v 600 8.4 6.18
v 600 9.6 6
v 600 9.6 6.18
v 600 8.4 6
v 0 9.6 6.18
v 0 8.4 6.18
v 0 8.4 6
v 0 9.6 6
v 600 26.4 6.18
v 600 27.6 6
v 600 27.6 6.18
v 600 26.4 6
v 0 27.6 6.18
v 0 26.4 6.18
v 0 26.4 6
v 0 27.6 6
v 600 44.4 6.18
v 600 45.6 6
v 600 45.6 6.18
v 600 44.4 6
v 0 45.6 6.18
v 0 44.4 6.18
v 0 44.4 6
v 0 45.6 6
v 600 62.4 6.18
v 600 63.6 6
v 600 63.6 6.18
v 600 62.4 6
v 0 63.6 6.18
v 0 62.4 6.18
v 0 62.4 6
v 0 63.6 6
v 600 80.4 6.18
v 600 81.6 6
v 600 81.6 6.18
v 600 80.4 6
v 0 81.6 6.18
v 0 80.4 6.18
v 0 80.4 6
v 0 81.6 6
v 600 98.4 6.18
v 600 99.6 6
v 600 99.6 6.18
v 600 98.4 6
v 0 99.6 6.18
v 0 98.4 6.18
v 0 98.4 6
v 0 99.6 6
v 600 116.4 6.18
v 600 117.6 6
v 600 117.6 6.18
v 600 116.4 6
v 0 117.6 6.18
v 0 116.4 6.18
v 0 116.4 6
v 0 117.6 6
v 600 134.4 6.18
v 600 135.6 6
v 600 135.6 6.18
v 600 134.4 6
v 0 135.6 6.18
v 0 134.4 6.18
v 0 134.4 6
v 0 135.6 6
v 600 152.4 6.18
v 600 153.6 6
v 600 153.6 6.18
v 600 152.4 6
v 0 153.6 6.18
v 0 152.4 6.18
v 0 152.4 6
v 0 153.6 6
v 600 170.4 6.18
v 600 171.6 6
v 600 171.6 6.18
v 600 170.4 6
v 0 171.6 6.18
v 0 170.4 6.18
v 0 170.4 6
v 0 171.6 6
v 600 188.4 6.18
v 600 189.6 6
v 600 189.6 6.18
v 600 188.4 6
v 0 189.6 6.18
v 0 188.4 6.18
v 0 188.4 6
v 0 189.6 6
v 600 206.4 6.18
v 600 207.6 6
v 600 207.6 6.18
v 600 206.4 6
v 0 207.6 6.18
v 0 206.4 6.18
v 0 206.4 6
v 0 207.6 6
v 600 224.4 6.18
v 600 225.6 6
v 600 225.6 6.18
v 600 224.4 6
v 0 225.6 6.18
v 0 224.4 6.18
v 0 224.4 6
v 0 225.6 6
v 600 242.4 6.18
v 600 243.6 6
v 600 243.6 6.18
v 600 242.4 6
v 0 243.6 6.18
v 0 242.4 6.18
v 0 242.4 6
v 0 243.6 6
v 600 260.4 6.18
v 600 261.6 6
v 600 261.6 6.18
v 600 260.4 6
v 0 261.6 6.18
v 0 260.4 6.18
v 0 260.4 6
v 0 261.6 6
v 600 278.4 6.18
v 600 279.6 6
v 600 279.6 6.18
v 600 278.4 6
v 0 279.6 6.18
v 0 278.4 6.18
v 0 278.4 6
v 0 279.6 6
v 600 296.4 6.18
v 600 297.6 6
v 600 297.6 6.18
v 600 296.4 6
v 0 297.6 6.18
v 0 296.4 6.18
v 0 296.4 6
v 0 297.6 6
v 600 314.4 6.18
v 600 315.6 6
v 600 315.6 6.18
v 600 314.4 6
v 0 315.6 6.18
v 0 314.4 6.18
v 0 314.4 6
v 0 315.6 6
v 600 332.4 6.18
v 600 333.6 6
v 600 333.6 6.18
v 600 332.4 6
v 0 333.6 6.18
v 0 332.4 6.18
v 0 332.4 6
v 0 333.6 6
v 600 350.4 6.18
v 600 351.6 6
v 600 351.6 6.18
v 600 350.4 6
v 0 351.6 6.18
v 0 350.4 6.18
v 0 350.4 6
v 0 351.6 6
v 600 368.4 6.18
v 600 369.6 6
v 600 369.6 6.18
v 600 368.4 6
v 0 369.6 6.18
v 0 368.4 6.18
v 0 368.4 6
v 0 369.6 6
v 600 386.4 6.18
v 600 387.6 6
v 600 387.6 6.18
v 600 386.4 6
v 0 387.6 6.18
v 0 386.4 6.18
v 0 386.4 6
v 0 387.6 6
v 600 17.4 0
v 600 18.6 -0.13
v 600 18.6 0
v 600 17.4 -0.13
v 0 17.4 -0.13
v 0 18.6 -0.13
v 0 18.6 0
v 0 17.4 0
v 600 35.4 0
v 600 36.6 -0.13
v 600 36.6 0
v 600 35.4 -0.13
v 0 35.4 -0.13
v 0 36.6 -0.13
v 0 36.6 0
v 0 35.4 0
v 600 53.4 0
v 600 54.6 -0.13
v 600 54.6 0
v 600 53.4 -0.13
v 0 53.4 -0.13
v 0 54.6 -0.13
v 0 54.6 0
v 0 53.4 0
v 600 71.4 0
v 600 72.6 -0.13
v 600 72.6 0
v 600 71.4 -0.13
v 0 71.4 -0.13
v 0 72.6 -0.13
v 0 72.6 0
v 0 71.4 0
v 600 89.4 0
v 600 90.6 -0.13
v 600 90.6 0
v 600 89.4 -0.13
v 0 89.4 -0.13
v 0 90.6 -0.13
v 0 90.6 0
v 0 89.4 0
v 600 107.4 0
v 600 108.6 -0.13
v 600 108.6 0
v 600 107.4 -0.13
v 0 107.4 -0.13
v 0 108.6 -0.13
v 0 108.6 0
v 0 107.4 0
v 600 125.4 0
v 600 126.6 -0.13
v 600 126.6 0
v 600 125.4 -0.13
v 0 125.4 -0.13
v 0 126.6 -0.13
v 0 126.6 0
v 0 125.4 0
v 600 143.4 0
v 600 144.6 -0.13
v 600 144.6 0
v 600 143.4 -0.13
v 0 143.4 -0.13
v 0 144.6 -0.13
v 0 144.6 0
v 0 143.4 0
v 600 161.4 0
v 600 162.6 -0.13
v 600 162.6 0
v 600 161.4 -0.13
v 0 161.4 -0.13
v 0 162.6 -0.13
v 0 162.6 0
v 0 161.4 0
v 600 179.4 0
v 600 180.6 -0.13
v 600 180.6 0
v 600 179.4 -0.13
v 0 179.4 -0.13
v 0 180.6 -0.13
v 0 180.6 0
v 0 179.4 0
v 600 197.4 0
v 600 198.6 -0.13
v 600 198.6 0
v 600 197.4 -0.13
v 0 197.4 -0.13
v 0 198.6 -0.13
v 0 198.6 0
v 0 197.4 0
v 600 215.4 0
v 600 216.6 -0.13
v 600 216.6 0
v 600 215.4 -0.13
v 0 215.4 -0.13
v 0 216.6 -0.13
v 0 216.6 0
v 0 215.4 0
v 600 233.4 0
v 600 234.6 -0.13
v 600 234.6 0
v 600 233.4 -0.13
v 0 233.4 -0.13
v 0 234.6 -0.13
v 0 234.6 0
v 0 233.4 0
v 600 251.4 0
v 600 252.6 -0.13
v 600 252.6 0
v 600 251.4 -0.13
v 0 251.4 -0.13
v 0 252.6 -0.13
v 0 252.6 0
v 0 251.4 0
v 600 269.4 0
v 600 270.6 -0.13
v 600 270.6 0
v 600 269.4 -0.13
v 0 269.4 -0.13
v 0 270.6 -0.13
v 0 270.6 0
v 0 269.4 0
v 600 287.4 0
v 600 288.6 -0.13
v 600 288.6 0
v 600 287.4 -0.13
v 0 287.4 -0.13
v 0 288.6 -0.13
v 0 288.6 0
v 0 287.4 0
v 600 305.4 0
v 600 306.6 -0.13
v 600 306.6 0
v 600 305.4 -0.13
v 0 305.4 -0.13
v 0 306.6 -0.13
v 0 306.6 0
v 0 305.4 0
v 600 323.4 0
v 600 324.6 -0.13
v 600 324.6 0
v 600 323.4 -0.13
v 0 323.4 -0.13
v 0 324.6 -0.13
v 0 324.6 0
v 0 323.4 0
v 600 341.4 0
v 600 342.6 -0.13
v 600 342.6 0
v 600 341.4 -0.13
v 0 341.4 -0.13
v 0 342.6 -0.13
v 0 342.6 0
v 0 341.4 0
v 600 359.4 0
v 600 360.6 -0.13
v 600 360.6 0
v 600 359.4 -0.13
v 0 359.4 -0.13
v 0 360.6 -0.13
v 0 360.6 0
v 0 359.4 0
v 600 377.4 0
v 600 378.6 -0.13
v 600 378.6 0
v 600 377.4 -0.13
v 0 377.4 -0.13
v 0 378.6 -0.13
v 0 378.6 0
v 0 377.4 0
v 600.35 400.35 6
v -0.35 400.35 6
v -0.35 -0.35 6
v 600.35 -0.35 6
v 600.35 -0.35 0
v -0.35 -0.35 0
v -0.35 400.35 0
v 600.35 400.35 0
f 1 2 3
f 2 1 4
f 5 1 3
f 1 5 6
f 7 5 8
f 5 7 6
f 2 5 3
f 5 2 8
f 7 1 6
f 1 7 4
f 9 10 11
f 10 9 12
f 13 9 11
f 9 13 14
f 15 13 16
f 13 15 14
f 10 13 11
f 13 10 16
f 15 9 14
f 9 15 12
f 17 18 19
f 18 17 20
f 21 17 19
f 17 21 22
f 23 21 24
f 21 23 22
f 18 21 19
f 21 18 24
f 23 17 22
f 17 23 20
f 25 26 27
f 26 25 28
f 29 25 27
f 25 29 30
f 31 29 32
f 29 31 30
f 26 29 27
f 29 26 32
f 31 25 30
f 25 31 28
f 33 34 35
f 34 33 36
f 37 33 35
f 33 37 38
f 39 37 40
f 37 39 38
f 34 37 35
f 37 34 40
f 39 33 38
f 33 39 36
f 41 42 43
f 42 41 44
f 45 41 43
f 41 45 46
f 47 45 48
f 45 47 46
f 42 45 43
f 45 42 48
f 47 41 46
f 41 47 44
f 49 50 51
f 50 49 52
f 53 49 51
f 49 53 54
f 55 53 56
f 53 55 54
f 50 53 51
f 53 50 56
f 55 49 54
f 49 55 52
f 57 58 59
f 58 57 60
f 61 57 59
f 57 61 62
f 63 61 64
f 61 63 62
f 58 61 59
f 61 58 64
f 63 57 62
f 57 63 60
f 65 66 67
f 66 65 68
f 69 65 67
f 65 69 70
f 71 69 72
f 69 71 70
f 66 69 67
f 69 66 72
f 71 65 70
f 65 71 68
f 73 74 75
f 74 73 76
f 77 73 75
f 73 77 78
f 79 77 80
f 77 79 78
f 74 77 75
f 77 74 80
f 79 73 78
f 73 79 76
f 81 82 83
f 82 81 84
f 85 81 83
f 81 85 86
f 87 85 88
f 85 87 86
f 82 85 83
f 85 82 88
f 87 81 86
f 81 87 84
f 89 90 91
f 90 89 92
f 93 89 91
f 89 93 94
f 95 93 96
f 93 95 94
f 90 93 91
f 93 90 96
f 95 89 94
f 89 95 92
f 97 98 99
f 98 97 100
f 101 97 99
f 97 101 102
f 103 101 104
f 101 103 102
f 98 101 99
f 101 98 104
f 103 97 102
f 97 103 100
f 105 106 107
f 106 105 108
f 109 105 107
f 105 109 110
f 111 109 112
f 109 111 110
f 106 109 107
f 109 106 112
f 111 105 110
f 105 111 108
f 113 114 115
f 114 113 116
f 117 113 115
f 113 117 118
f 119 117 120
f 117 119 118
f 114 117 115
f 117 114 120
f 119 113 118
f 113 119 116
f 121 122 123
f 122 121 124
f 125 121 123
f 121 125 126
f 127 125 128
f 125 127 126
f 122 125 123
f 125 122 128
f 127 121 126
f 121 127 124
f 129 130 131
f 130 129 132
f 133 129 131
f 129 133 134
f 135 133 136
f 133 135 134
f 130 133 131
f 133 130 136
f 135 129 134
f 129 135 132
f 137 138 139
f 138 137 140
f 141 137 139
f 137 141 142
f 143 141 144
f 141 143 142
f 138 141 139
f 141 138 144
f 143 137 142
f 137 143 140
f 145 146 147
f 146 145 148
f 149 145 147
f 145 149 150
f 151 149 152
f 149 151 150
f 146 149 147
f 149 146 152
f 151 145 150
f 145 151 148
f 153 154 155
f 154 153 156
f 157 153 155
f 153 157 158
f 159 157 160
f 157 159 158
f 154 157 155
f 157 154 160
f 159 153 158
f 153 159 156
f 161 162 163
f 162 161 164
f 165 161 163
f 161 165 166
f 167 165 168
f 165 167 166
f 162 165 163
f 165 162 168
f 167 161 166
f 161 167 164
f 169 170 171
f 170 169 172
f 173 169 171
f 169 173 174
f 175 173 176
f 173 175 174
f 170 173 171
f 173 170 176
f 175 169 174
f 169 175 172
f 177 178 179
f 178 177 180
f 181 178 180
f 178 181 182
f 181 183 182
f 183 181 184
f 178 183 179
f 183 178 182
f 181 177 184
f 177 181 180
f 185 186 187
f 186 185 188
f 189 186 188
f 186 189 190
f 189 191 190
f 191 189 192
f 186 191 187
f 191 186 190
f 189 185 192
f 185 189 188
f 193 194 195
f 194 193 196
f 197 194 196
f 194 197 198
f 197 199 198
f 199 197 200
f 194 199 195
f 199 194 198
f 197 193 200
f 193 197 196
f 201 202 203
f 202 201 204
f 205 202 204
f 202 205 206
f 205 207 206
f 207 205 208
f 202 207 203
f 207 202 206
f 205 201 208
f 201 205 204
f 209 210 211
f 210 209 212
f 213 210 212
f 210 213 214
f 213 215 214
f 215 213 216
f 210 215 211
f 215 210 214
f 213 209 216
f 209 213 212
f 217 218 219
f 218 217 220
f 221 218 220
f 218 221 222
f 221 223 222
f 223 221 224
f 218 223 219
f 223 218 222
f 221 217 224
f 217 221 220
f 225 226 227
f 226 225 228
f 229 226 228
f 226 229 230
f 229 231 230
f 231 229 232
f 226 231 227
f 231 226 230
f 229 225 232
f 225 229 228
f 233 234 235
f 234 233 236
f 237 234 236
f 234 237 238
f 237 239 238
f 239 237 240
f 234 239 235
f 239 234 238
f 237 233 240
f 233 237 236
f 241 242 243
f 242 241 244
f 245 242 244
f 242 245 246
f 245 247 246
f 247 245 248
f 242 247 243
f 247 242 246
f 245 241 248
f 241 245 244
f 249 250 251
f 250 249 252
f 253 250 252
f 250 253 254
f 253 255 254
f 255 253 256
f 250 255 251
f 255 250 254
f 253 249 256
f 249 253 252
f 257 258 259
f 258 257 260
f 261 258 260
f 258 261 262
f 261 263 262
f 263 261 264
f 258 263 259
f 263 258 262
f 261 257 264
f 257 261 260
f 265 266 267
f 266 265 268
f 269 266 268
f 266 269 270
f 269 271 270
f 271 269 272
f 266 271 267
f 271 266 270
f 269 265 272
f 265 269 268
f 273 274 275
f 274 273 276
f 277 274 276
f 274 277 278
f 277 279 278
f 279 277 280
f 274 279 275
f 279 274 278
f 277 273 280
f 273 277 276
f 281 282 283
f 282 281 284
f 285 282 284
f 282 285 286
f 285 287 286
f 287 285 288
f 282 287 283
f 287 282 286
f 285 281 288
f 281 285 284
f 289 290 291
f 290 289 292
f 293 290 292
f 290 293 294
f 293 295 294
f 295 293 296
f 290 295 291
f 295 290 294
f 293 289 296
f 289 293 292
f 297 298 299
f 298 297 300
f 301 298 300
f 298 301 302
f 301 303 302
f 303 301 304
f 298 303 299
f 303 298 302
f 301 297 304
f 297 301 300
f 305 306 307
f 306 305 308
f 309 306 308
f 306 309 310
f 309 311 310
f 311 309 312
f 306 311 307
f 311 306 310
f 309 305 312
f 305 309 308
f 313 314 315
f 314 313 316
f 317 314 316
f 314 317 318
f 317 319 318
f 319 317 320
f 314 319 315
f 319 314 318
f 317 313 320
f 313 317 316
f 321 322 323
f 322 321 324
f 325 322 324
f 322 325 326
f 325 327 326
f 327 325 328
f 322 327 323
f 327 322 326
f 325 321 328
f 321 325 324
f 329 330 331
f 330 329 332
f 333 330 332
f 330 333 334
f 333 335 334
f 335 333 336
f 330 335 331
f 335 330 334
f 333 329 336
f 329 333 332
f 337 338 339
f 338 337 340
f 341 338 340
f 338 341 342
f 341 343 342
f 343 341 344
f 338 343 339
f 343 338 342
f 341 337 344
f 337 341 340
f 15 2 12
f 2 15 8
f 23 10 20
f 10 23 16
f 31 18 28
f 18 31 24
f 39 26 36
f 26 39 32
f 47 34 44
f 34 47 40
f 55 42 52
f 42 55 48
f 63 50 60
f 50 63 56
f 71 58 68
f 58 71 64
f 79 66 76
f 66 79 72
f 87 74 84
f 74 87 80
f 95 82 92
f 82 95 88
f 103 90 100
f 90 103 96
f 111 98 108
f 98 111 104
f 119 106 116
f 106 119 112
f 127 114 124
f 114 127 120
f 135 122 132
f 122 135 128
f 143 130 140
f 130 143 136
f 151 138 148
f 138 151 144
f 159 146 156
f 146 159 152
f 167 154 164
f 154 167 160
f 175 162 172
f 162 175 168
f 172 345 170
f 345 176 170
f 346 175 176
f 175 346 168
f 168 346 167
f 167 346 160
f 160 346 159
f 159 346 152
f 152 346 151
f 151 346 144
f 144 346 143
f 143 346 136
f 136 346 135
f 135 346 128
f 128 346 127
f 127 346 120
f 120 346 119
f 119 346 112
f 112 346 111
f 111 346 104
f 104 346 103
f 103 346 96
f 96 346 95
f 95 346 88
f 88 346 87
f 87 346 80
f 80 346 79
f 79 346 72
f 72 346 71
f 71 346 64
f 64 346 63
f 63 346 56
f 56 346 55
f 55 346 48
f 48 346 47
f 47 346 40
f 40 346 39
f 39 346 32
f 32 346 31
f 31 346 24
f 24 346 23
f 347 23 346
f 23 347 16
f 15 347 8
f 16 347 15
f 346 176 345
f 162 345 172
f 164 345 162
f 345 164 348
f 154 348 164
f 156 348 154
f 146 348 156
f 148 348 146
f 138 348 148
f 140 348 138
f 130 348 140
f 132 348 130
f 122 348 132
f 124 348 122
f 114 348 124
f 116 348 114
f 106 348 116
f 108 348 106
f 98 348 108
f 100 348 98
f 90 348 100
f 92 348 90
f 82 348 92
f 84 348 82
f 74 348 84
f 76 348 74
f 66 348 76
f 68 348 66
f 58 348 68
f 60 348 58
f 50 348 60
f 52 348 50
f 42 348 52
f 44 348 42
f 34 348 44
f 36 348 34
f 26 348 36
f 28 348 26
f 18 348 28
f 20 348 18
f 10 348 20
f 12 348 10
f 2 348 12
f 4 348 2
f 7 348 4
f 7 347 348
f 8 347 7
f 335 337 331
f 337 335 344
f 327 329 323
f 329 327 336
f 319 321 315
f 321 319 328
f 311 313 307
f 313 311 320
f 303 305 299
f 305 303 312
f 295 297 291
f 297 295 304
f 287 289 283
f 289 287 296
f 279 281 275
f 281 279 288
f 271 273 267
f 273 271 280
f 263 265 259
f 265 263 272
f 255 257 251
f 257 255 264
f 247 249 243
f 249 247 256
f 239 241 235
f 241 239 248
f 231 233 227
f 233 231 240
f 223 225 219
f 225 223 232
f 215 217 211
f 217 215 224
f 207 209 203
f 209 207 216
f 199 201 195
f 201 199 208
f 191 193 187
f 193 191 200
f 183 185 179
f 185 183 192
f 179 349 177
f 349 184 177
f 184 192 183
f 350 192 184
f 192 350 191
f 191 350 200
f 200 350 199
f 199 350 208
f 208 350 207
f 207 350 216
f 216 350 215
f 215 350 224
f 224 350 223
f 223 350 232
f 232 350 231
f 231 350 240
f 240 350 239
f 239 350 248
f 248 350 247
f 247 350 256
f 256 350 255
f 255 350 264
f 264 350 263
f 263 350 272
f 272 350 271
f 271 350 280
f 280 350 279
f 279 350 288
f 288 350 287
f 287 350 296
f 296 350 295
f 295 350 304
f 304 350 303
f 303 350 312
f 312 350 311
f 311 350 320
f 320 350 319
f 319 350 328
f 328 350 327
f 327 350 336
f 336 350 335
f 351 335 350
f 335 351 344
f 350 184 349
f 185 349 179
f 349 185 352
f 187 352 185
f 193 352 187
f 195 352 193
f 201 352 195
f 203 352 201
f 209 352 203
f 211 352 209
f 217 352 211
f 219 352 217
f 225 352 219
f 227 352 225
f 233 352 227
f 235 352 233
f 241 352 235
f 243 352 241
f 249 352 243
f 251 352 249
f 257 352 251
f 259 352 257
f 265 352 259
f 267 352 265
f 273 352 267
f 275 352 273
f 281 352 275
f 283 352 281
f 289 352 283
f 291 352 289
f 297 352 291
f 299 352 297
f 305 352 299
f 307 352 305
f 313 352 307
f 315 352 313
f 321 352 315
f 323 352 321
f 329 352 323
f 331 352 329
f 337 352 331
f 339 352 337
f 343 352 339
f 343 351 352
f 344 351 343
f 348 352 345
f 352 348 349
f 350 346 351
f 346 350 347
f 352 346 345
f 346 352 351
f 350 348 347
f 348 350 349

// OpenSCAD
$fn = 64;

// Sheet MDF
sheet_x = 600;
sheet_y = 400;
sheet_thickness = 6;

// Detail parameters (kept as ONE connected solid)
bevel = 0.6;                 // small edge chamfer
grain_amp = 0.18;            // subtle surface variation
grain_step = 18;             // spacing of grain ridges
grain_w = 1.2;               // ridge width
grain_h = grain_amp;         // ridge height
overlap = 0.05;              // ensures union connectivity

module mdf_sheet(x, y, t) {
    // Robustness clamps to avoid invalid/empty geometry
    b = min(bevel, x/4, y/4, t/4);
    eh = min(grain_h, t/3);
    eb = min(0.35, x/10, y/10);

    union() {
        // Base sheet with slight bevel (single solid)
        color([0.78, 0.67, 0.50])
        hull() {
            cube([x, y, t], center=false);
            translate([b, b, b])
                cube([max(0.01, x - 2*b), max(0.01, y - 2*b), max(0.01, t - 2*b)], center=false);
        }

        // Subtle "fiber/grain" ridges on top face (connected via overlap)
        color([0.80, 0.70, 0.54])
        for (yy = [grain_step/2 : grain_step : y - grain_step/2]) {
            translate([0, yy - grain_w/2, t - overlap])
                cube([x, grain_w, eh + overlap], center=false);
        }

        // Subtle "fiber/grain" ridges on bottom face (connected via overlap)
        color([0.76, 0.65, 0.48])
        for (yy = [grain_step : grain_step : y - grain_step]) {
            translate([0, yy - grain_w/2, -eh + overlap])
                cube([x, grain_w, eh + overlap], center=false);
        }

        // Slight edge band hint (connected via overlap)
        color([0.74, 0.62, 0.45])
        translate([-eb, -eb, 0])
            cube([x + 2*eb, y + 2*eb, t], center=false);
    }
}

mdf_sheet(sheet_x, sheet_y, sheet_thickness);
